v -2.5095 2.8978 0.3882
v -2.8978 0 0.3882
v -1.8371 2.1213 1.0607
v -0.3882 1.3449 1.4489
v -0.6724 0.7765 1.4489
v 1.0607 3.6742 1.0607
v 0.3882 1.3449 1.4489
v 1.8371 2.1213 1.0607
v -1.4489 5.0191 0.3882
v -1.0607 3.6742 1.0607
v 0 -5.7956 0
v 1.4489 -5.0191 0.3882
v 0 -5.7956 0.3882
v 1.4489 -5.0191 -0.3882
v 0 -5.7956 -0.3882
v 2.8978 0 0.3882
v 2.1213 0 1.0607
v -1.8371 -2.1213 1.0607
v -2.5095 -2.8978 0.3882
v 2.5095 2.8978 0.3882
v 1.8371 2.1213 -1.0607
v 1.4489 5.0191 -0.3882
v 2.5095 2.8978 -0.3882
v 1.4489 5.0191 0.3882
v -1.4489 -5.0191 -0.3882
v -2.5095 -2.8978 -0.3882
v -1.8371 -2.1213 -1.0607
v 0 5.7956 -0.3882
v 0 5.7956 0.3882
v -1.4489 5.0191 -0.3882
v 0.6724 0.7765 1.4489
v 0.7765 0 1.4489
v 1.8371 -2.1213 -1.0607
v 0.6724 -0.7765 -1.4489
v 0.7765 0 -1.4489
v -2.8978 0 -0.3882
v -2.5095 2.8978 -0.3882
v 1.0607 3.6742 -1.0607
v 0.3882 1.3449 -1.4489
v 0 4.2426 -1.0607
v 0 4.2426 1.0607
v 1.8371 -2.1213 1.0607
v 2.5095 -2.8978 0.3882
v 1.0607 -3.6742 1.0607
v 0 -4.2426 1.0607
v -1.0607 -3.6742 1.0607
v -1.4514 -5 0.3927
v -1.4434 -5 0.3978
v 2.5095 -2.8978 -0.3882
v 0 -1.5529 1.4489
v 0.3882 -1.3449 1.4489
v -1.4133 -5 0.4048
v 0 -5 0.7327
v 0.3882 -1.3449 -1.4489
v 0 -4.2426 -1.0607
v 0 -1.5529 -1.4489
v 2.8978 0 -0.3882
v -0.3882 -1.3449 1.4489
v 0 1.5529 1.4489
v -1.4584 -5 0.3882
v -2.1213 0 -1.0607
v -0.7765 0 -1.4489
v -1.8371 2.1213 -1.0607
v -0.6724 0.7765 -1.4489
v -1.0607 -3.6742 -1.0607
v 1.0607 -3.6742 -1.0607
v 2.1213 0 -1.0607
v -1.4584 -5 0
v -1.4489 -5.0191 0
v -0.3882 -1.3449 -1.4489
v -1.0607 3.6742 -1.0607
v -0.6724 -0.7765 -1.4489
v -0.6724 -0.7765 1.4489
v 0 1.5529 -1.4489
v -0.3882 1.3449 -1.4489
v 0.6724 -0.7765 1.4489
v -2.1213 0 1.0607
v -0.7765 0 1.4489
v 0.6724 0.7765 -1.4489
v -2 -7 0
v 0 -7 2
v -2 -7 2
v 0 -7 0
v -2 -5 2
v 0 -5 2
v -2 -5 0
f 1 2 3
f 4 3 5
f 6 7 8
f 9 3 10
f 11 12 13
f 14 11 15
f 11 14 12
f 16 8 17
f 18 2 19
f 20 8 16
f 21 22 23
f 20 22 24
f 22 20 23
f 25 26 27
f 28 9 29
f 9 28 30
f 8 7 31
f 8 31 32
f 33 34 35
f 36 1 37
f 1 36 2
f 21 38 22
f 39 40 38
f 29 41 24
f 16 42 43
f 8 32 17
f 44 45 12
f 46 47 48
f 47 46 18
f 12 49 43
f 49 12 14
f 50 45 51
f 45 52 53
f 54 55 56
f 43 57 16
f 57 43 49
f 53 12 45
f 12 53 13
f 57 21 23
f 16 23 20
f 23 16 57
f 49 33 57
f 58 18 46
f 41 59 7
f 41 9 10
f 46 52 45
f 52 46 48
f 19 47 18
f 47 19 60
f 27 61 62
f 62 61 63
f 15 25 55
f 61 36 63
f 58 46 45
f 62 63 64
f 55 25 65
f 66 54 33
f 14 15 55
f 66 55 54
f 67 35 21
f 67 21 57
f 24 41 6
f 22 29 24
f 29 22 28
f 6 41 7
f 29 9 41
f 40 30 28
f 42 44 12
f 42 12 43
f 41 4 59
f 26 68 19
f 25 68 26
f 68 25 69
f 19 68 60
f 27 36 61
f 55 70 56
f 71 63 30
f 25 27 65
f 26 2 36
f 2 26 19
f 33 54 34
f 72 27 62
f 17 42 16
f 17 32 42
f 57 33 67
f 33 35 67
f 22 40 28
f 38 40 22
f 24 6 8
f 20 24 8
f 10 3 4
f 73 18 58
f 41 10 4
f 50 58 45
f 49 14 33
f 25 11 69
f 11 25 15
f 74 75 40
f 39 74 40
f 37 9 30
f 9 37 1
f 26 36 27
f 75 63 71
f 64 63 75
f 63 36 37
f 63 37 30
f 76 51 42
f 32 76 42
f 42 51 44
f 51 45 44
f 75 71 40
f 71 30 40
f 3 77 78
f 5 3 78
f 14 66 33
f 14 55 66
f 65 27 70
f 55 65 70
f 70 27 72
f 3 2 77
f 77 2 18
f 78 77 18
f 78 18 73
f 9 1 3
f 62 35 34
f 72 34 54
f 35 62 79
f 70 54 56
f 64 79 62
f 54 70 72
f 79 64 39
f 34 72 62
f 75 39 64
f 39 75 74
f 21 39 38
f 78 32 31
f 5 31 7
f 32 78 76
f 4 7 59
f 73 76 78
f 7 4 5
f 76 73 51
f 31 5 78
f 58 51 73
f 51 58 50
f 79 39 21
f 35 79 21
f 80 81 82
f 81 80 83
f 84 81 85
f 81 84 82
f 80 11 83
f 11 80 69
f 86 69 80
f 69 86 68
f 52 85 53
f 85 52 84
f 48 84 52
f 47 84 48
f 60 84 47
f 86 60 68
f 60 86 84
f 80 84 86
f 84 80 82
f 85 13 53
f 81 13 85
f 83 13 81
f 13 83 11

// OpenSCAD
// non-uniform scale and mirror
scale([1, 2, 0.5]) sphere(3, $fn = 12);
mirror([1, 1, 0]) translate([5, 0, 0]) cube(2);
